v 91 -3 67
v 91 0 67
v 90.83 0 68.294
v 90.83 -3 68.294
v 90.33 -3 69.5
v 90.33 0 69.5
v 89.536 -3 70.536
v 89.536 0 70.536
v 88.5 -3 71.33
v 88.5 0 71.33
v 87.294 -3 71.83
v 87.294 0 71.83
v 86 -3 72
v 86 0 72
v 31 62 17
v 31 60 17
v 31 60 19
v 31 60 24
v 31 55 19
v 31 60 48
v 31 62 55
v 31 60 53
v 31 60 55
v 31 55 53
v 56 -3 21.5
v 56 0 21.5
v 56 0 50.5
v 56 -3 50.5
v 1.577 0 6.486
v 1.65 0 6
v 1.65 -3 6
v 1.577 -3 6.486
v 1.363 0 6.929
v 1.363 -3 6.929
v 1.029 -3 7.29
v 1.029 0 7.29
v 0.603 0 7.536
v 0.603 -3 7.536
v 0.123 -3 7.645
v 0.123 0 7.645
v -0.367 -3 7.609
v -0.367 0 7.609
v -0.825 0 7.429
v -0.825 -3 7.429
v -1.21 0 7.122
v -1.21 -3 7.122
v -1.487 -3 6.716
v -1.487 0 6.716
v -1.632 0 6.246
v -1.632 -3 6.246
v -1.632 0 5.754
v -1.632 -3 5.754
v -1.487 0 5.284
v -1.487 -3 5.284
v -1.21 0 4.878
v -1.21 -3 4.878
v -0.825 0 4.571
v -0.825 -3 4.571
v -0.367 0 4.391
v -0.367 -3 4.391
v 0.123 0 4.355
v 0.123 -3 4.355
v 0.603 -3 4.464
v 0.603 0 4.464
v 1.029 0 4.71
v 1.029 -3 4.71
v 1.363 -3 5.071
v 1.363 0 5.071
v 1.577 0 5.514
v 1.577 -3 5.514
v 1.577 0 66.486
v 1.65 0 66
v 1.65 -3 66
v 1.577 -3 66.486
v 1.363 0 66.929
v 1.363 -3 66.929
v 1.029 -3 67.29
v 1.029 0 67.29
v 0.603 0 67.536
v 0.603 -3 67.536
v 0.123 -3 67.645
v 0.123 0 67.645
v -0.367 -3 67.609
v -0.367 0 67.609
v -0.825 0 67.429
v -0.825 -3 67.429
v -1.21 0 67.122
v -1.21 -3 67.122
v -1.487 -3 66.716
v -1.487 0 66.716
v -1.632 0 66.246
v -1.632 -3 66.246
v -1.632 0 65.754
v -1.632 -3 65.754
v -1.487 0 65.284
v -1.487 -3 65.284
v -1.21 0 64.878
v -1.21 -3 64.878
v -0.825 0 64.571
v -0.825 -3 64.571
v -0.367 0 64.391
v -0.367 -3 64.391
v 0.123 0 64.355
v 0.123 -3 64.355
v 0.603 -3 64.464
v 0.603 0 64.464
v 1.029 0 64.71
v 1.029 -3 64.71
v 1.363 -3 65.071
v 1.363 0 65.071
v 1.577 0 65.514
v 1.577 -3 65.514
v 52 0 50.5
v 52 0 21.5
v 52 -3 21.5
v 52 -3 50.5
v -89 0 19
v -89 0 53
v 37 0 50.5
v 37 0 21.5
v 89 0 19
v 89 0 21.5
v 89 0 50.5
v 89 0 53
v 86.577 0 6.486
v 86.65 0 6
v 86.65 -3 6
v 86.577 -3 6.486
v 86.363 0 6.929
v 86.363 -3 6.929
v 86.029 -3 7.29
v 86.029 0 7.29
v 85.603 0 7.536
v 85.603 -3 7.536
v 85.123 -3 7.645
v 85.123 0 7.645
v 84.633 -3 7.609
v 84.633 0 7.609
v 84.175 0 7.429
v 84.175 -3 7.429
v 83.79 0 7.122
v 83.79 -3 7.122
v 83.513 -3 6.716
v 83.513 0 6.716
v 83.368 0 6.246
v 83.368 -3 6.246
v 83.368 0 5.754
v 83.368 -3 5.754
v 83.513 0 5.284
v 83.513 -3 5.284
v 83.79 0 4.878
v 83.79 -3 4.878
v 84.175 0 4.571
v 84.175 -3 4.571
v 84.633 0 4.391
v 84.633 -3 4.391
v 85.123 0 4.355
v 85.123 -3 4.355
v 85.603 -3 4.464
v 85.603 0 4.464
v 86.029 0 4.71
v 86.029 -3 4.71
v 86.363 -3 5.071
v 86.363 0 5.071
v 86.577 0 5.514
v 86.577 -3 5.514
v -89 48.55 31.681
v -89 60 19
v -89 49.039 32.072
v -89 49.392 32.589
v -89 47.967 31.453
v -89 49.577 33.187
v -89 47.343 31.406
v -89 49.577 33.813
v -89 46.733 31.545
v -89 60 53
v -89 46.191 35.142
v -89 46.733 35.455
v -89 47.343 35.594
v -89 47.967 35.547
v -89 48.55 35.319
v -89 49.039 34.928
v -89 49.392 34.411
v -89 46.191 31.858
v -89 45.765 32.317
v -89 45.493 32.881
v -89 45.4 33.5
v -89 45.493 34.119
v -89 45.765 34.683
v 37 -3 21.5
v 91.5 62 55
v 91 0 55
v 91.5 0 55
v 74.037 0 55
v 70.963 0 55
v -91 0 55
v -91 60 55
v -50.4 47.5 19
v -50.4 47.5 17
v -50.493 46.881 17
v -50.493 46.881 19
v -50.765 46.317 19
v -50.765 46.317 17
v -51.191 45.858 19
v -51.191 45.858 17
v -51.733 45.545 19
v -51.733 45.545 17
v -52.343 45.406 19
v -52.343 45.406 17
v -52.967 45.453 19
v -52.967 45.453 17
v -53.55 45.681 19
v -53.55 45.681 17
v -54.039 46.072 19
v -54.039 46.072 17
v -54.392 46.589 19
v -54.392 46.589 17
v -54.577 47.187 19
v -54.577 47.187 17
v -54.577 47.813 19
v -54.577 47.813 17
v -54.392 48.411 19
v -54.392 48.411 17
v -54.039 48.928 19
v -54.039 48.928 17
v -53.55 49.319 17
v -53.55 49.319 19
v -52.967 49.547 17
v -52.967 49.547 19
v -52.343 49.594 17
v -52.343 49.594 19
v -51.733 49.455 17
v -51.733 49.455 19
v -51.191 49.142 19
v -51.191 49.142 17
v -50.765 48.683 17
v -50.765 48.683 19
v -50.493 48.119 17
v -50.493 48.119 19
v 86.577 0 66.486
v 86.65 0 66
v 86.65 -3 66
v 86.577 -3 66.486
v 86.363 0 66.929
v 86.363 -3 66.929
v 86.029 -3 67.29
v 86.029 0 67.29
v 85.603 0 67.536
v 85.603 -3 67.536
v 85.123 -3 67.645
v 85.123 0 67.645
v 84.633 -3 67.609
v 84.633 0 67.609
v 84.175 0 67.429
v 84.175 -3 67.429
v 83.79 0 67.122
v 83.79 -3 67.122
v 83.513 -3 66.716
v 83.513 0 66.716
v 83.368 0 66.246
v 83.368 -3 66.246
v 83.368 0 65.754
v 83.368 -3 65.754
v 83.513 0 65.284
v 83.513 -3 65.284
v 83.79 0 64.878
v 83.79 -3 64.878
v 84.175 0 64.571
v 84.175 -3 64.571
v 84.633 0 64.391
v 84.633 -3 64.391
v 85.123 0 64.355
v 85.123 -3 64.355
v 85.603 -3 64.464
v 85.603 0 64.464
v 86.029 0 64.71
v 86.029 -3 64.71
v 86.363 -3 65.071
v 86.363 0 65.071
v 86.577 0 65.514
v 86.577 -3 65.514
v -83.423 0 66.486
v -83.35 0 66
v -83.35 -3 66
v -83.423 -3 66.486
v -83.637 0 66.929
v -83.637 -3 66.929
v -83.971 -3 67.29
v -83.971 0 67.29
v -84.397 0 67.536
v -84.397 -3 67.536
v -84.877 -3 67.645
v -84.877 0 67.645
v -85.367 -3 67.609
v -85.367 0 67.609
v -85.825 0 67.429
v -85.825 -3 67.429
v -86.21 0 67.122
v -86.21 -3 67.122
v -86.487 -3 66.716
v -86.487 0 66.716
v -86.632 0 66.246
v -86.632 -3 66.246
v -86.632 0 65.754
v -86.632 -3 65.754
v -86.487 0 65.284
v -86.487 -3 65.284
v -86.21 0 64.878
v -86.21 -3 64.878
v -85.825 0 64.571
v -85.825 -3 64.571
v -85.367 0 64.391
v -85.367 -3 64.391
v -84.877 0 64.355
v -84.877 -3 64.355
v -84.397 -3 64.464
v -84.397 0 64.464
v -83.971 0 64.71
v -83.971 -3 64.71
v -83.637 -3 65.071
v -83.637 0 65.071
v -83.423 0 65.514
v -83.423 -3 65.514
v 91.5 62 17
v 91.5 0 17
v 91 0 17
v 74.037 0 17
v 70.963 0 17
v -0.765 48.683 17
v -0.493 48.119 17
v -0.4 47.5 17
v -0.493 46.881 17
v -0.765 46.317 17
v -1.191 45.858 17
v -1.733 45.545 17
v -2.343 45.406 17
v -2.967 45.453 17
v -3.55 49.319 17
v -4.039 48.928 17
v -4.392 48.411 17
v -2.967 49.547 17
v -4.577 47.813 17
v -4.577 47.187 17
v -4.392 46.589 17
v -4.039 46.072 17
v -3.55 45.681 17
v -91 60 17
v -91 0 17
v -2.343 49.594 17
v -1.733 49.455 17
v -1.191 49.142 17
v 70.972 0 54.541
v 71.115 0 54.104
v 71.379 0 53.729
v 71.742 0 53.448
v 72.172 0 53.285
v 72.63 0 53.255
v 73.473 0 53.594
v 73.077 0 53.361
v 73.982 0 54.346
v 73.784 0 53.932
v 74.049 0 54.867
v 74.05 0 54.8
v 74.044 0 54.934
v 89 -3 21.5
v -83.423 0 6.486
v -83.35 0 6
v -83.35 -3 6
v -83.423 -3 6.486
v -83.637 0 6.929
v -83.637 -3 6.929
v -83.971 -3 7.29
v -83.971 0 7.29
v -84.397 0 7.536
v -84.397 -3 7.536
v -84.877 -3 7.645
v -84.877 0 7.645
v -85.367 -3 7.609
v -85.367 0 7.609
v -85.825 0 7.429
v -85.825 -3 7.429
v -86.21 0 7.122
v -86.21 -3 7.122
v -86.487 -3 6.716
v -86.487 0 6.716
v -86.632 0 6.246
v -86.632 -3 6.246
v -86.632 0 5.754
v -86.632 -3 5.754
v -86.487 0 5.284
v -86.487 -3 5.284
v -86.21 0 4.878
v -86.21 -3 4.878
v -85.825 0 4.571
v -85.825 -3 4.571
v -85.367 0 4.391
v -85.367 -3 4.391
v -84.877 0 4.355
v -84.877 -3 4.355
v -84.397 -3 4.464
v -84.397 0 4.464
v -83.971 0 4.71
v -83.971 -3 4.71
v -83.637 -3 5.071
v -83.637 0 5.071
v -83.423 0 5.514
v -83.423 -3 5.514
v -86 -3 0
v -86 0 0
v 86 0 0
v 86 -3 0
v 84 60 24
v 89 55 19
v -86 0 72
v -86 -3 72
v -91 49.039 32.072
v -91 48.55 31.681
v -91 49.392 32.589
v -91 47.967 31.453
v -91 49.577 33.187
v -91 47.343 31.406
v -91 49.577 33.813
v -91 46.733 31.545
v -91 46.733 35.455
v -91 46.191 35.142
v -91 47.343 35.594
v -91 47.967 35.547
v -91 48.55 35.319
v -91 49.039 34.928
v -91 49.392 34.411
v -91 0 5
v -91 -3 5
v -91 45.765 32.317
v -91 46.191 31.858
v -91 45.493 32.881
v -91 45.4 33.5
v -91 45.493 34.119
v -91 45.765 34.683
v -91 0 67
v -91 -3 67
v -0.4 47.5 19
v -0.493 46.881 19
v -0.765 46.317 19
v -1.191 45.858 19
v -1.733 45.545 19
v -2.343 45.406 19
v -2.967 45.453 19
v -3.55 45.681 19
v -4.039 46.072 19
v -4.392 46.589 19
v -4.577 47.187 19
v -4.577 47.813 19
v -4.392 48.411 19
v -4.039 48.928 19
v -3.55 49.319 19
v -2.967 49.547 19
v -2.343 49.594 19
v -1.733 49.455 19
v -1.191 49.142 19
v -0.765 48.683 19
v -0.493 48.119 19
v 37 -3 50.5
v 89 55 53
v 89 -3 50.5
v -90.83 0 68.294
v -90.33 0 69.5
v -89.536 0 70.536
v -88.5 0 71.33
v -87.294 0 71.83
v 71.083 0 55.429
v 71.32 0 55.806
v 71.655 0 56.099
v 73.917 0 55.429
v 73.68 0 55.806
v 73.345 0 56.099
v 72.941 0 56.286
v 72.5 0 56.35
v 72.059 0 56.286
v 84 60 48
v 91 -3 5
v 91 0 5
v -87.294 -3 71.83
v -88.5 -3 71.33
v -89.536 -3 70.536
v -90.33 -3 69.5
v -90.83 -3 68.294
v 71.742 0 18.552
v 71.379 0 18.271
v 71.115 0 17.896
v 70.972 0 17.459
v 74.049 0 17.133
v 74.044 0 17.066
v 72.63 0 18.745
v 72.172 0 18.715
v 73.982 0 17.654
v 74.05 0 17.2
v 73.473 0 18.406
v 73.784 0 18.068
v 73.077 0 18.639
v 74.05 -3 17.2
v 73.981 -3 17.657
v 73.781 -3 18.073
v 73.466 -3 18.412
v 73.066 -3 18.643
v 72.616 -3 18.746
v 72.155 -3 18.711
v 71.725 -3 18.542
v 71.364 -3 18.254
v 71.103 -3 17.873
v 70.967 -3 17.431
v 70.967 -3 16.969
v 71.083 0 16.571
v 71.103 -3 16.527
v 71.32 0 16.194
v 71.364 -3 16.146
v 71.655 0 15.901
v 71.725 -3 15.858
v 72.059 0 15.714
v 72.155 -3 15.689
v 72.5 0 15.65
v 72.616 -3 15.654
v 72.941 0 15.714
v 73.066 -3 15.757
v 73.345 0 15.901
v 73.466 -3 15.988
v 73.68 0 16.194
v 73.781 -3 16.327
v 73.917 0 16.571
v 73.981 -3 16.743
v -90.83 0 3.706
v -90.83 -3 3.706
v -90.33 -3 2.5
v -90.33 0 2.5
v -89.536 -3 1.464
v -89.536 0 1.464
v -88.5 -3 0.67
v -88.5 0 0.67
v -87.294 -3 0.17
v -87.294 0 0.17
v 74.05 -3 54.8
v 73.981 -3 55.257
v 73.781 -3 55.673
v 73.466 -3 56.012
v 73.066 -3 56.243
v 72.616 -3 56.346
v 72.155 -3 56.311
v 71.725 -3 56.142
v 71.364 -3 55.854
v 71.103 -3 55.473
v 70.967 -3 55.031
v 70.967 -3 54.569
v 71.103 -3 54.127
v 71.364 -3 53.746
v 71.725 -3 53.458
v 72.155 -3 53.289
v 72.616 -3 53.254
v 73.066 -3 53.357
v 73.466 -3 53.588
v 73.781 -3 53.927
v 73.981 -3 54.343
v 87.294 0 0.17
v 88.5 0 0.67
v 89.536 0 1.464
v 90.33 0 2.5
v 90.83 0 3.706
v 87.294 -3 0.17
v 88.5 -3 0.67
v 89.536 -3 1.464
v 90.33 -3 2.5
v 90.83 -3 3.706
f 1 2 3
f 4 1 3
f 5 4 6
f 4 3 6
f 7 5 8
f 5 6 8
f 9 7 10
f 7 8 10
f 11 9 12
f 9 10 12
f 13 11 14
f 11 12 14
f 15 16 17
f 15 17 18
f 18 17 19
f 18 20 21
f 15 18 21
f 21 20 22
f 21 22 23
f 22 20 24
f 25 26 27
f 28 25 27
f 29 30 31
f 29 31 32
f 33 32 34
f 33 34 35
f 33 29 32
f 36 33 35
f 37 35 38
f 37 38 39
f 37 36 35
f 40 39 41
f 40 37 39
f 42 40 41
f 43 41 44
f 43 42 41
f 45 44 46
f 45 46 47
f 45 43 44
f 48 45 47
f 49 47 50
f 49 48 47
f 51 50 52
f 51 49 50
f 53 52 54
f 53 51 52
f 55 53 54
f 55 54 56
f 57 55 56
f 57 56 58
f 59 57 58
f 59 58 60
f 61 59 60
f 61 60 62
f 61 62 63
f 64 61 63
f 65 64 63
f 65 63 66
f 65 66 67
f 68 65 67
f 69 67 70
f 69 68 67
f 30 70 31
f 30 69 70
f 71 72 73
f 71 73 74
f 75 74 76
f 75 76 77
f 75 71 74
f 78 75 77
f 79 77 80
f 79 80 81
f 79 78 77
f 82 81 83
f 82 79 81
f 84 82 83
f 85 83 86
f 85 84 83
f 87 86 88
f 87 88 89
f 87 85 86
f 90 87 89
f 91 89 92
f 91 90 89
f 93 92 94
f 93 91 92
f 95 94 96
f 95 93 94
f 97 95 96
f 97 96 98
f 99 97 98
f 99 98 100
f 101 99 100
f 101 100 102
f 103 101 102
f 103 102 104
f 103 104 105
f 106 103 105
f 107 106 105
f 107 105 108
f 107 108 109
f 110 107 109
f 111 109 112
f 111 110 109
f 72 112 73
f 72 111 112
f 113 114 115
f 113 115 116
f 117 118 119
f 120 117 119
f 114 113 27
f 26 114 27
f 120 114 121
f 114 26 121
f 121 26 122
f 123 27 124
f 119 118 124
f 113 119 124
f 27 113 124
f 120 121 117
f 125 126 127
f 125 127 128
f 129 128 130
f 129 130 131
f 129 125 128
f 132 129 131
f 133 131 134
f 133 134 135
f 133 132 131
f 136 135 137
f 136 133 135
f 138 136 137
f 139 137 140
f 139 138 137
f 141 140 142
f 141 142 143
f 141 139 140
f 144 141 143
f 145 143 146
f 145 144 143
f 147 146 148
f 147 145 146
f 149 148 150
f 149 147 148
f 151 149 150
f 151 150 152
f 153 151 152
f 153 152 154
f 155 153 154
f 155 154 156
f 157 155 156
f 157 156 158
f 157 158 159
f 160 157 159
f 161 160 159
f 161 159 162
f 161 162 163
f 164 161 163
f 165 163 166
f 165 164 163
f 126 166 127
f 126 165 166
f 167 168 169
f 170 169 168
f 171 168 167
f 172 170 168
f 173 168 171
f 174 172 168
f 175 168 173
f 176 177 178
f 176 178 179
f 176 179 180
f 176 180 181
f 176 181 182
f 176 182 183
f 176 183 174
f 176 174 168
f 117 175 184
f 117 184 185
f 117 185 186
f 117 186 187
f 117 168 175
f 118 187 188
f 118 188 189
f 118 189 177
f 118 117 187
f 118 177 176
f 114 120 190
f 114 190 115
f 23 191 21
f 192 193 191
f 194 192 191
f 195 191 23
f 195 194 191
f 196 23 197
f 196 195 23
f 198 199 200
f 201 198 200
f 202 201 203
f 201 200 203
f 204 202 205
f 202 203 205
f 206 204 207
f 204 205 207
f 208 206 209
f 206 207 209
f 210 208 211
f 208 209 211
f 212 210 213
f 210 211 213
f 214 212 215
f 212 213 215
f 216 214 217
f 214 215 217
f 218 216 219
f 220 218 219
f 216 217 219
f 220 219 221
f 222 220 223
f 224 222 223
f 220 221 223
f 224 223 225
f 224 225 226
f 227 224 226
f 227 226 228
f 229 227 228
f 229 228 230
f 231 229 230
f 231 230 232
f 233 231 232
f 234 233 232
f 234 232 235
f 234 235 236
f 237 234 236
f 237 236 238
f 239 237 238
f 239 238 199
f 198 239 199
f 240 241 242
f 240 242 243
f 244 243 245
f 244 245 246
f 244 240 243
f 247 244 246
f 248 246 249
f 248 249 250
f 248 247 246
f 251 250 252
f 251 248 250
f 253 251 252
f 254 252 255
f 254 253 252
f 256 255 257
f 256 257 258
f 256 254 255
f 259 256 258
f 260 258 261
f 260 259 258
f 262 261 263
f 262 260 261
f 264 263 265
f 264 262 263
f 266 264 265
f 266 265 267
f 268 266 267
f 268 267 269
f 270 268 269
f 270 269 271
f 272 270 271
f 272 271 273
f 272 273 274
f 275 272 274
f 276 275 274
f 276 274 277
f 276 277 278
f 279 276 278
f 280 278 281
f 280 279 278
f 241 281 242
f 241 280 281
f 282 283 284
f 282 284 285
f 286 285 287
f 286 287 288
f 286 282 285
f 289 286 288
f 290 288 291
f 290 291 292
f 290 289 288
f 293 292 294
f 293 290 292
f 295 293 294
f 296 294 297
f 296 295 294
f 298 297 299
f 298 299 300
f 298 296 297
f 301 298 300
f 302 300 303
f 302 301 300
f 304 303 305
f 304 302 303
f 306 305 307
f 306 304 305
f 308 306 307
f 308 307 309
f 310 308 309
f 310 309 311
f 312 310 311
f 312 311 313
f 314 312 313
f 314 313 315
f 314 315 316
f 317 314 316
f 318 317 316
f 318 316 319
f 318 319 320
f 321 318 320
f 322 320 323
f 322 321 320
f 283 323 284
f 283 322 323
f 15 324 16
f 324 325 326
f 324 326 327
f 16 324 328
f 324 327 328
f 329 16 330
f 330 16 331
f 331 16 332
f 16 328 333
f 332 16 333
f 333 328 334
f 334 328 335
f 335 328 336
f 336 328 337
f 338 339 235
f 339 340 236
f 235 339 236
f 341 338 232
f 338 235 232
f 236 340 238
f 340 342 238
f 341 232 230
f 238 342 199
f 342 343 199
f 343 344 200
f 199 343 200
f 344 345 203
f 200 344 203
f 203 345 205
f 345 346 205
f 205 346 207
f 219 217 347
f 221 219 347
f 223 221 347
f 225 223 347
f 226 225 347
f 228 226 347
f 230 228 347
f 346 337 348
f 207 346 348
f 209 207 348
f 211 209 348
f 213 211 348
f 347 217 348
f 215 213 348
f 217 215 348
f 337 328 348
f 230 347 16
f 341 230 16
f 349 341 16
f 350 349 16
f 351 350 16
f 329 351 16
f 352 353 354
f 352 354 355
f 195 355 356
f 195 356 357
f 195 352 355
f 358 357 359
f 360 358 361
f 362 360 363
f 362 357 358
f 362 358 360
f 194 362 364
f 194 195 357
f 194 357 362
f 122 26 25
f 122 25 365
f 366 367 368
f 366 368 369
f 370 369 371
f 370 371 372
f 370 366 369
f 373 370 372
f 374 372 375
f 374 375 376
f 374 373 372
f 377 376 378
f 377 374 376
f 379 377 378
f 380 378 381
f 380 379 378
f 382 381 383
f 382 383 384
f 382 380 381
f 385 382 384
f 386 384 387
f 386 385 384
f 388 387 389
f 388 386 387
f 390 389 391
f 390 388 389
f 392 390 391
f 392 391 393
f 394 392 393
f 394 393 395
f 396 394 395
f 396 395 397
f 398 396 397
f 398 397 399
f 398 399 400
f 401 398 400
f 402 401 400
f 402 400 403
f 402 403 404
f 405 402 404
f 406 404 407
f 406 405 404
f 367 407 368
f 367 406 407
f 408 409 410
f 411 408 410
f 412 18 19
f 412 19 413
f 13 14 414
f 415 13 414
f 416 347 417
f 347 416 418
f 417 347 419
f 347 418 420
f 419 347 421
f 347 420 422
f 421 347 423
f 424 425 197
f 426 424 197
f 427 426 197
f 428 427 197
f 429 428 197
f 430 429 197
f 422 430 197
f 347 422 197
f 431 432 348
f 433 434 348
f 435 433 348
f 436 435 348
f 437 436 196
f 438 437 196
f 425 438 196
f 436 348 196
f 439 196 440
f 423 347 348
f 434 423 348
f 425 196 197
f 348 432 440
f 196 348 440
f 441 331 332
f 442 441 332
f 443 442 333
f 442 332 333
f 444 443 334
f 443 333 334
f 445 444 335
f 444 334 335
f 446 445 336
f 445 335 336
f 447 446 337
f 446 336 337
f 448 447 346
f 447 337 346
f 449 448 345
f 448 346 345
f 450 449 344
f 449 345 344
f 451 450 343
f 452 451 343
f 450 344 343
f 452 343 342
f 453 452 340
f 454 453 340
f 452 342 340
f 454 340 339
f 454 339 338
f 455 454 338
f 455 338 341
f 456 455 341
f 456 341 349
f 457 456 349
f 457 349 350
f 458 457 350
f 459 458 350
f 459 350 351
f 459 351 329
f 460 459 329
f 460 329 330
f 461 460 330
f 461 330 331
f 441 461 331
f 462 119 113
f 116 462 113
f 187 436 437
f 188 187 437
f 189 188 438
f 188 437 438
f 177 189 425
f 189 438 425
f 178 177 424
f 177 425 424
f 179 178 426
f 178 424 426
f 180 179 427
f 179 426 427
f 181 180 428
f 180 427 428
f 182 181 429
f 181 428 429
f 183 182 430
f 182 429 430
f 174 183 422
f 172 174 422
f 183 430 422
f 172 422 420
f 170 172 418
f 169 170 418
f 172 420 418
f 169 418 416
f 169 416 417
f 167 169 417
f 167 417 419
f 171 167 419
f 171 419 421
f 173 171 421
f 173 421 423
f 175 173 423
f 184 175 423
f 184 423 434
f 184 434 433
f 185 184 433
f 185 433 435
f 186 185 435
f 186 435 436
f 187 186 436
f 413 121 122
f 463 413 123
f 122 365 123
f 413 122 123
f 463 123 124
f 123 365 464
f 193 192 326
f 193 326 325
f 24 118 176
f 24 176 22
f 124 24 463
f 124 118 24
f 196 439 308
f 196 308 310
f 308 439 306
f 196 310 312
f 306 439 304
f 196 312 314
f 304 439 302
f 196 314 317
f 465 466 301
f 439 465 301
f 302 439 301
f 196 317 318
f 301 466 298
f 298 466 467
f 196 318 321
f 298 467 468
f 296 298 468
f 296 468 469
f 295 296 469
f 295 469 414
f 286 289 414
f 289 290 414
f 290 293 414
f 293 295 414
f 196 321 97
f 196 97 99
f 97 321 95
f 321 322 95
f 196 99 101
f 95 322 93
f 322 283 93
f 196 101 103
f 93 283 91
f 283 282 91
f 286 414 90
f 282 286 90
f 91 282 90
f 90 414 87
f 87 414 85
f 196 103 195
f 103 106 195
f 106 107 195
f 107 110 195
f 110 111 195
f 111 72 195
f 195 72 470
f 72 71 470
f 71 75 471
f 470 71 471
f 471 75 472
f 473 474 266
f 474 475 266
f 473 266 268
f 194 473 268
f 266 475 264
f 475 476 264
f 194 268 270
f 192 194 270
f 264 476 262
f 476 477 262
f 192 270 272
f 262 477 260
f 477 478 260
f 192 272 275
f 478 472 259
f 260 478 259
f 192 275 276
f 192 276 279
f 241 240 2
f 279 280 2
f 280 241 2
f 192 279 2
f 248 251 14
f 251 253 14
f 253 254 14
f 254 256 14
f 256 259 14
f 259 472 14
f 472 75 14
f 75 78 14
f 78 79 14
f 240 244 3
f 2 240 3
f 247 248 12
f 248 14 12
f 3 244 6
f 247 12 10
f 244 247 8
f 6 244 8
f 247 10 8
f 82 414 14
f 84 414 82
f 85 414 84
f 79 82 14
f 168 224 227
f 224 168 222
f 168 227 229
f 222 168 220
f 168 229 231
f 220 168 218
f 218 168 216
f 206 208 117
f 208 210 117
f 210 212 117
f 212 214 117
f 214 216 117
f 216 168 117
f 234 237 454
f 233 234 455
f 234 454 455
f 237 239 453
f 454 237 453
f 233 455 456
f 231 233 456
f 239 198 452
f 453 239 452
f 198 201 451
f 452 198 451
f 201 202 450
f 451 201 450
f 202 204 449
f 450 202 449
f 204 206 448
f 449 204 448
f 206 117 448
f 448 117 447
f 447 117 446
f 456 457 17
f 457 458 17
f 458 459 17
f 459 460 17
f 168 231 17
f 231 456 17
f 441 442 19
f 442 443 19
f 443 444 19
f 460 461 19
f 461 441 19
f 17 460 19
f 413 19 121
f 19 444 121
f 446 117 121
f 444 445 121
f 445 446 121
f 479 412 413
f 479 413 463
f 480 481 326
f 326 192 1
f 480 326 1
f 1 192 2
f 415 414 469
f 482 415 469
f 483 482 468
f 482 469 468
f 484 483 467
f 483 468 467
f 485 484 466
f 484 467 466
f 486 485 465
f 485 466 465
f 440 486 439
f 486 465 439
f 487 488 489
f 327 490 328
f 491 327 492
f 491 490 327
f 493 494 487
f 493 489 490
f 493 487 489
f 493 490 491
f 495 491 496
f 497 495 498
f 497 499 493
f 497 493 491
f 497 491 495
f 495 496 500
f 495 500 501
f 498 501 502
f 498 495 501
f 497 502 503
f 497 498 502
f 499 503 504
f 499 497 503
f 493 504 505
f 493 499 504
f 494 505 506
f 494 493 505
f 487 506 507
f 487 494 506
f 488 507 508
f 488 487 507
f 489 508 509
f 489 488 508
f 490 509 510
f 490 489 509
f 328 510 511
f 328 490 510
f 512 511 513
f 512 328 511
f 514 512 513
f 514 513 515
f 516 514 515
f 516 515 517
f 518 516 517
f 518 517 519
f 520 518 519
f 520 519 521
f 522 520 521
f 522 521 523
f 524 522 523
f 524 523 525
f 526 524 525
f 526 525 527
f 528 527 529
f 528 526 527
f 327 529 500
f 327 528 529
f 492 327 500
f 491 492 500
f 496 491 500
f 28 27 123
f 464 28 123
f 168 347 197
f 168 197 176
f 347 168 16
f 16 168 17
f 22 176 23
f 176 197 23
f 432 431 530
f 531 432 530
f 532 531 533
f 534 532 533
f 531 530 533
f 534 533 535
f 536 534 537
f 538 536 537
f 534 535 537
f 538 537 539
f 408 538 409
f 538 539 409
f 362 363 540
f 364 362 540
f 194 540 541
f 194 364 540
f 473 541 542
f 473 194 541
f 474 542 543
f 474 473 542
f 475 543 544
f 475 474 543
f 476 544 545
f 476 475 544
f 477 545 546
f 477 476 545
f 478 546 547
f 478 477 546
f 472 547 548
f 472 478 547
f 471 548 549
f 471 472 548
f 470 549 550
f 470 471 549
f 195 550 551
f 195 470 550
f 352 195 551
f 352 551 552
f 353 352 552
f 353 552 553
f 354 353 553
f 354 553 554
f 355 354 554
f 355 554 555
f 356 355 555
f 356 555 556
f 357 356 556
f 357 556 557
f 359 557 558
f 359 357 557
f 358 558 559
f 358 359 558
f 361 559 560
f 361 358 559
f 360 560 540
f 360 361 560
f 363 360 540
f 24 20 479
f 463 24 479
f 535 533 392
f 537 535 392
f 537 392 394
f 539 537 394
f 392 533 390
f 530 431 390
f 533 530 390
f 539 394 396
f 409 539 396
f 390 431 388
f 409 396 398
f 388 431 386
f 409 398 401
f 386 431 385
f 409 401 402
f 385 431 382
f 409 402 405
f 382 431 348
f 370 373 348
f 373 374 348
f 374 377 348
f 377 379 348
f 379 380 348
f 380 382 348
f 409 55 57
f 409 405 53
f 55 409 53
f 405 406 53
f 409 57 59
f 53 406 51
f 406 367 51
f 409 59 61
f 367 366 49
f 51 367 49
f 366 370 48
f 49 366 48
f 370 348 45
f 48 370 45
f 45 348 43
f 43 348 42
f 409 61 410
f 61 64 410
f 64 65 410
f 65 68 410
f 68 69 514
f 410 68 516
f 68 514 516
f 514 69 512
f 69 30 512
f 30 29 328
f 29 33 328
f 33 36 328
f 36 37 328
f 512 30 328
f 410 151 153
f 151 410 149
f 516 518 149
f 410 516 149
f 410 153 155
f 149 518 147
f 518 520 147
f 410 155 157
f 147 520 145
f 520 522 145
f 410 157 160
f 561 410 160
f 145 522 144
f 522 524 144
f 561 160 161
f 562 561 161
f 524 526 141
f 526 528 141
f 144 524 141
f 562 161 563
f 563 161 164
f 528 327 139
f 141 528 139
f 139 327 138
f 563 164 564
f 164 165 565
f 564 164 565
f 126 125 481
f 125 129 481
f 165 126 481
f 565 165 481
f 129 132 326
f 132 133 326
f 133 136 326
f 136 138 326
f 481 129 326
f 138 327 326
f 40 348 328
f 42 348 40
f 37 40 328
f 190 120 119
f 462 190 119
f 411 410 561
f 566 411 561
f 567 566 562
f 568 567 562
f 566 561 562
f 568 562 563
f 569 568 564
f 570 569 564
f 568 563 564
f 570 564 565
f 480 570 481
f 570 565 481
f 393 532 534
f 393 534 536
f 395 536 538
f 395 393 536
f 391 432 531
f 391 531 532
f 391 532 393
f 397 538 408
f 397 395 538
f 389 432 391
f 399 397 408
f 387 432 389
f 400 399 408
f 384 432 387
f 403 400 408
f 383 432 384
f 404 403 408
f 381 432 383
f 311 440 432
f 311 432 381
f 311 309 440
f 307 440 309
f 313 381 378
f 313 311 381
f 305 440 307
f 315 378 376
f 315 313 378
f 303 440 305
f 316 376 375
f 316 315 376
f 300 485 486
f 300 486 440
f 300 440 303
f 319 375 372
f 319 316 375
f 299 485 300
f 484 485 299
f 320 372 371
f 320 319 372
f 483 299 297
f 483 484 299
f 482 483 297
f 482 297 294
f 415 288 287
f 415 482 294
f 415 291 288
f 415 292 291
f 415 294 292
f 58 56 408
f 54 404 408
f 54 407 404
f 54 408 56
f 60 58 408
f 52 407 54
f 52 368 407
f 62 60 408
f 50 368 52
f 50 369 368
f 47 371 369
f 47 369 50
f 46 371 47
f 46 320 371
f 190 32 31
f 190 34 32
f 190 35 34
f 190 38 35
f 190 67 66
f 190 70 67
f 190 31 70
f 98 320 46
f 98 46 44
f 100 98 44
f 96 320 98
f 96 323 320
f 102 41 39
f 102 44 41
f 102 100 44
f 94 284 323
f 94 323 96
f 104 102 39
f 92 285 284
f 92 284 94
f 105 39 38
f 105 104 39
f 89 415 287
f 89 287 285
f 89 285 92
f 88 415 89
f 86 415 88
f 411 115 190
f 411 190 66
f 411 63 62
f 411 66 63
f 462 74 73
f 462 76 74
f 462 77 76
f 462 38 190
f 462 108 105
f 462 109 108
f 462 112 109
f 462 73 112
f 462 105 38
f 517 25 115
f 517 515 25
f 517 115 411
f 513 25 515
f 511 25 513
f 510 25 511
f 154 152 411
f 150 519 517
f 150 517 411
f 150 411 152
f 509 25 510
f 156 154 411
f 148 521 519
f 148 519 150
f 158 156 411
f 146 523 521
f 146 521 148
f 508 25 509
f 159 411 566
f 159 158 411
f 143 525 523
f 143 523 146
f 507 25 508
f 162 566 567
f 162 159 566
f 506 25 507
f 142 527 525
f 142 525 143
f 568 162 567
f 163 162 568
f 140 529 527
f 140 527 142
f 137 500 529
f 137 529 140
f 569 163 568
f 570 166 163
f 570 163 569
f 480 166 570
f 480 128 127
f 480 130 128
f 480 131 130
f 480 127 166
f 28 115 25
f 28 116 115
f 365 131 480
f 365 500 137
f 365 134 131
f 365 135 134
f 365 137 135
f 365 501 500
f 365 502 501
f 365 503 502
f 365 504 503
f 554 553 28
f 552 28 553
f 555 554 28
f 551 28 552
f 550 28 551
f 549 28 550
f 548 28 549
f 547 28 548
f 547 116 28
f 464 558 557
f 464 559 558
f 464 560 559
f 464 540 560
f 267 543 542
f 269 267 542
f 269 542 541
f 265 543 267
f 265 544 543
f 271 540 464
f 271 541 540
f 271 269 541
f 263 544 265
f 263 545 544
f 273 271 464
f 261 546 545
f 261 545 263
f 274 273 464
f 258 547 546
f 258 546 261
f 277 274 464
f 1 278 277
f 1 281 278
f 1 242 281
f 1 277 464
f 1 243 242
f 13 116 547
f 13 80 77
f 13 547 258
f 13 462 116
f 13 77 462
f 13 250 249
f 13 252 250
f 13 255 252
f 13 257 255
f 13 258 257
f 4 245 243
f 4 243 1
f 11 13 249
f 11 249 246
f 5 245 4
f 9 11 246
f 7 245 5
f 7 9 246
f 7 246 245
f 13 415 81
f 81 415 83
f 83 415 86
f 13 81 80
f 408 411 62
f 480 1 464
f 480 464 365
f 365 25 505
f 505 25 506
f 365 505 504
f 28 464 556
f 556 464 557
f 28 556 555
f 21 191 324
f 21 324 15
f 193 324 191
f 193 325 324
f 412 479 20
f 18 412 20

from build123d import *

# Parameters (mm, degrees)
F0_R     = 1.65
F0_R_2   = 1.55
F0_W     = 15
F0_H     = 29
F0_W_2   = 33
F1_DEPTH = 3
F2_W     = 182.5
F2_H     = 38
F2_W_2   = 178
F2_H_2   = 34
F3_DEPTH = 60
F4_R     = 2.1
F5_DEPTH = 25
F6_R     = 2.1
F7_DEPTH = 25
F8_W     = 60.5
F8_H     = 38
F9_DEPTH = 2
F10_SIZE = 5


with BuildPart() as f1:
    # F0 (on Front) → F1 (new body)
    with BuildSketch(Plane.XZ):
        with BuildLine():
            Line((86, 72), (-86, 72))
            ThreePointArc((-86, 72), (-89.5355339059, 70.5355339059), (-91, 67))
            Line((-91, 67), (-91, 5))
            ThreePointArc((-91, 5), (-89.5355339059, 1.4644660941), (-86, 0))
            Line((-86, 0), (86, 0))
            ThreePointArc((86, 0), (89.5355339059, 1.4644660941), (91, 5))
            Line((91, 5), (91, 67))
            ThreePointArc((91, 67), (89.5355339059, 70.5355339059), (86, 72))
        make_face()
        with Locations((-85, 6)):
            Circle(F0_R, mode=Mode.SUBTRACT)
        with Locations((0, 6)):
            Circle(F0_R, mode=Mode.SUBTRACT)
        with Locations((85, 6)):
            Circle(F0_R, mode=Mode.SUBTRACT)
        with Locations((72.5, 17.2)):
            Circle(F0_R_2, mode=Mode.SUBTRACT)
        with Locations((44.5, 36)):
            Rectangle(F0_W, F0_H, mode=Mode.SUBTRACT)
        with Locations((72.5, 36)):
            Rectangle(F0_W_2, F0_H, mode=Mode.SUBTRACT)
        with Locations((-85, 66)):
            Circle(F0_R, mode=Mode.SUBTRACT)
        with Locations((0, 66)):
            Circle(F0_R, mode=Mode.SUBTRACT)
        with Locations((72.5, 54.8)):
            Circle(F0_R_2, mode=Mode.SUBTRACT)
        with Locations((85, 66)):
            Circle(F0_R, mode=Mode.SUBTRACT)
    extrude(amount=F1_DEPTH)

    # F2 (on face) → F3 (join)
    with BuildSketch(Plane.XZ):
        with Locations((0.25, 36)):
            Rectangle(F2_W, F2_H)
        with Locations((0, 36)):
            Rectangle(F2_W_2, F2_H_2, mode=Mode.SUBTRACT)
    extrude(amount=-F3_DEPTH)

    # F4 (on face) → F5 (cut)
    with BuildSketch(Plane(origin=(0, 0, 17), x_dir=(1, 0, 0), z_dir=(0, 0, -1))):
        with Locations((-52.5, -47.5)):
            Circle(F4_R)
        with Locations((-2.5, -47.5)):
            Circle(F4_R)
    extrude(amount=-F5_DEPTH, mode=Mode.SUBTRACT)

    # F6 (on face) → F7 (cut)
    with BuildSketch(Plane(origin=(-91, 0, 0), x_dir=(0, -1, 0), z_dir=(-1, 0, 0))):
        with Locations((-47.5, 33.5)):
            Circle(F6_R)
    extrude(amount=-F7_DEPTH, mode=Mode.SUBTRACT)

    # F8 (on face) → F9 (join)
    with BuildSketch(Plane(origin=(0, 60, 0), x_dir=(-1, 0, 0), z_dir=(0, 1, 0))):
        with Locations((-61.25, 36)):
            Rectangle(F8_W, F8_H)
    extrude(amount=F9_DEPTH)

    # F10
    f10_edges = [f1.edges().sort_by_distance(p)[0] for p in [
        (89, 60, 36),
        (60, 60, 53),
        (60, 60, 19),
    ]]
    chamfer(f10_edges, length=F10_SIZE)


solid = f1.part
